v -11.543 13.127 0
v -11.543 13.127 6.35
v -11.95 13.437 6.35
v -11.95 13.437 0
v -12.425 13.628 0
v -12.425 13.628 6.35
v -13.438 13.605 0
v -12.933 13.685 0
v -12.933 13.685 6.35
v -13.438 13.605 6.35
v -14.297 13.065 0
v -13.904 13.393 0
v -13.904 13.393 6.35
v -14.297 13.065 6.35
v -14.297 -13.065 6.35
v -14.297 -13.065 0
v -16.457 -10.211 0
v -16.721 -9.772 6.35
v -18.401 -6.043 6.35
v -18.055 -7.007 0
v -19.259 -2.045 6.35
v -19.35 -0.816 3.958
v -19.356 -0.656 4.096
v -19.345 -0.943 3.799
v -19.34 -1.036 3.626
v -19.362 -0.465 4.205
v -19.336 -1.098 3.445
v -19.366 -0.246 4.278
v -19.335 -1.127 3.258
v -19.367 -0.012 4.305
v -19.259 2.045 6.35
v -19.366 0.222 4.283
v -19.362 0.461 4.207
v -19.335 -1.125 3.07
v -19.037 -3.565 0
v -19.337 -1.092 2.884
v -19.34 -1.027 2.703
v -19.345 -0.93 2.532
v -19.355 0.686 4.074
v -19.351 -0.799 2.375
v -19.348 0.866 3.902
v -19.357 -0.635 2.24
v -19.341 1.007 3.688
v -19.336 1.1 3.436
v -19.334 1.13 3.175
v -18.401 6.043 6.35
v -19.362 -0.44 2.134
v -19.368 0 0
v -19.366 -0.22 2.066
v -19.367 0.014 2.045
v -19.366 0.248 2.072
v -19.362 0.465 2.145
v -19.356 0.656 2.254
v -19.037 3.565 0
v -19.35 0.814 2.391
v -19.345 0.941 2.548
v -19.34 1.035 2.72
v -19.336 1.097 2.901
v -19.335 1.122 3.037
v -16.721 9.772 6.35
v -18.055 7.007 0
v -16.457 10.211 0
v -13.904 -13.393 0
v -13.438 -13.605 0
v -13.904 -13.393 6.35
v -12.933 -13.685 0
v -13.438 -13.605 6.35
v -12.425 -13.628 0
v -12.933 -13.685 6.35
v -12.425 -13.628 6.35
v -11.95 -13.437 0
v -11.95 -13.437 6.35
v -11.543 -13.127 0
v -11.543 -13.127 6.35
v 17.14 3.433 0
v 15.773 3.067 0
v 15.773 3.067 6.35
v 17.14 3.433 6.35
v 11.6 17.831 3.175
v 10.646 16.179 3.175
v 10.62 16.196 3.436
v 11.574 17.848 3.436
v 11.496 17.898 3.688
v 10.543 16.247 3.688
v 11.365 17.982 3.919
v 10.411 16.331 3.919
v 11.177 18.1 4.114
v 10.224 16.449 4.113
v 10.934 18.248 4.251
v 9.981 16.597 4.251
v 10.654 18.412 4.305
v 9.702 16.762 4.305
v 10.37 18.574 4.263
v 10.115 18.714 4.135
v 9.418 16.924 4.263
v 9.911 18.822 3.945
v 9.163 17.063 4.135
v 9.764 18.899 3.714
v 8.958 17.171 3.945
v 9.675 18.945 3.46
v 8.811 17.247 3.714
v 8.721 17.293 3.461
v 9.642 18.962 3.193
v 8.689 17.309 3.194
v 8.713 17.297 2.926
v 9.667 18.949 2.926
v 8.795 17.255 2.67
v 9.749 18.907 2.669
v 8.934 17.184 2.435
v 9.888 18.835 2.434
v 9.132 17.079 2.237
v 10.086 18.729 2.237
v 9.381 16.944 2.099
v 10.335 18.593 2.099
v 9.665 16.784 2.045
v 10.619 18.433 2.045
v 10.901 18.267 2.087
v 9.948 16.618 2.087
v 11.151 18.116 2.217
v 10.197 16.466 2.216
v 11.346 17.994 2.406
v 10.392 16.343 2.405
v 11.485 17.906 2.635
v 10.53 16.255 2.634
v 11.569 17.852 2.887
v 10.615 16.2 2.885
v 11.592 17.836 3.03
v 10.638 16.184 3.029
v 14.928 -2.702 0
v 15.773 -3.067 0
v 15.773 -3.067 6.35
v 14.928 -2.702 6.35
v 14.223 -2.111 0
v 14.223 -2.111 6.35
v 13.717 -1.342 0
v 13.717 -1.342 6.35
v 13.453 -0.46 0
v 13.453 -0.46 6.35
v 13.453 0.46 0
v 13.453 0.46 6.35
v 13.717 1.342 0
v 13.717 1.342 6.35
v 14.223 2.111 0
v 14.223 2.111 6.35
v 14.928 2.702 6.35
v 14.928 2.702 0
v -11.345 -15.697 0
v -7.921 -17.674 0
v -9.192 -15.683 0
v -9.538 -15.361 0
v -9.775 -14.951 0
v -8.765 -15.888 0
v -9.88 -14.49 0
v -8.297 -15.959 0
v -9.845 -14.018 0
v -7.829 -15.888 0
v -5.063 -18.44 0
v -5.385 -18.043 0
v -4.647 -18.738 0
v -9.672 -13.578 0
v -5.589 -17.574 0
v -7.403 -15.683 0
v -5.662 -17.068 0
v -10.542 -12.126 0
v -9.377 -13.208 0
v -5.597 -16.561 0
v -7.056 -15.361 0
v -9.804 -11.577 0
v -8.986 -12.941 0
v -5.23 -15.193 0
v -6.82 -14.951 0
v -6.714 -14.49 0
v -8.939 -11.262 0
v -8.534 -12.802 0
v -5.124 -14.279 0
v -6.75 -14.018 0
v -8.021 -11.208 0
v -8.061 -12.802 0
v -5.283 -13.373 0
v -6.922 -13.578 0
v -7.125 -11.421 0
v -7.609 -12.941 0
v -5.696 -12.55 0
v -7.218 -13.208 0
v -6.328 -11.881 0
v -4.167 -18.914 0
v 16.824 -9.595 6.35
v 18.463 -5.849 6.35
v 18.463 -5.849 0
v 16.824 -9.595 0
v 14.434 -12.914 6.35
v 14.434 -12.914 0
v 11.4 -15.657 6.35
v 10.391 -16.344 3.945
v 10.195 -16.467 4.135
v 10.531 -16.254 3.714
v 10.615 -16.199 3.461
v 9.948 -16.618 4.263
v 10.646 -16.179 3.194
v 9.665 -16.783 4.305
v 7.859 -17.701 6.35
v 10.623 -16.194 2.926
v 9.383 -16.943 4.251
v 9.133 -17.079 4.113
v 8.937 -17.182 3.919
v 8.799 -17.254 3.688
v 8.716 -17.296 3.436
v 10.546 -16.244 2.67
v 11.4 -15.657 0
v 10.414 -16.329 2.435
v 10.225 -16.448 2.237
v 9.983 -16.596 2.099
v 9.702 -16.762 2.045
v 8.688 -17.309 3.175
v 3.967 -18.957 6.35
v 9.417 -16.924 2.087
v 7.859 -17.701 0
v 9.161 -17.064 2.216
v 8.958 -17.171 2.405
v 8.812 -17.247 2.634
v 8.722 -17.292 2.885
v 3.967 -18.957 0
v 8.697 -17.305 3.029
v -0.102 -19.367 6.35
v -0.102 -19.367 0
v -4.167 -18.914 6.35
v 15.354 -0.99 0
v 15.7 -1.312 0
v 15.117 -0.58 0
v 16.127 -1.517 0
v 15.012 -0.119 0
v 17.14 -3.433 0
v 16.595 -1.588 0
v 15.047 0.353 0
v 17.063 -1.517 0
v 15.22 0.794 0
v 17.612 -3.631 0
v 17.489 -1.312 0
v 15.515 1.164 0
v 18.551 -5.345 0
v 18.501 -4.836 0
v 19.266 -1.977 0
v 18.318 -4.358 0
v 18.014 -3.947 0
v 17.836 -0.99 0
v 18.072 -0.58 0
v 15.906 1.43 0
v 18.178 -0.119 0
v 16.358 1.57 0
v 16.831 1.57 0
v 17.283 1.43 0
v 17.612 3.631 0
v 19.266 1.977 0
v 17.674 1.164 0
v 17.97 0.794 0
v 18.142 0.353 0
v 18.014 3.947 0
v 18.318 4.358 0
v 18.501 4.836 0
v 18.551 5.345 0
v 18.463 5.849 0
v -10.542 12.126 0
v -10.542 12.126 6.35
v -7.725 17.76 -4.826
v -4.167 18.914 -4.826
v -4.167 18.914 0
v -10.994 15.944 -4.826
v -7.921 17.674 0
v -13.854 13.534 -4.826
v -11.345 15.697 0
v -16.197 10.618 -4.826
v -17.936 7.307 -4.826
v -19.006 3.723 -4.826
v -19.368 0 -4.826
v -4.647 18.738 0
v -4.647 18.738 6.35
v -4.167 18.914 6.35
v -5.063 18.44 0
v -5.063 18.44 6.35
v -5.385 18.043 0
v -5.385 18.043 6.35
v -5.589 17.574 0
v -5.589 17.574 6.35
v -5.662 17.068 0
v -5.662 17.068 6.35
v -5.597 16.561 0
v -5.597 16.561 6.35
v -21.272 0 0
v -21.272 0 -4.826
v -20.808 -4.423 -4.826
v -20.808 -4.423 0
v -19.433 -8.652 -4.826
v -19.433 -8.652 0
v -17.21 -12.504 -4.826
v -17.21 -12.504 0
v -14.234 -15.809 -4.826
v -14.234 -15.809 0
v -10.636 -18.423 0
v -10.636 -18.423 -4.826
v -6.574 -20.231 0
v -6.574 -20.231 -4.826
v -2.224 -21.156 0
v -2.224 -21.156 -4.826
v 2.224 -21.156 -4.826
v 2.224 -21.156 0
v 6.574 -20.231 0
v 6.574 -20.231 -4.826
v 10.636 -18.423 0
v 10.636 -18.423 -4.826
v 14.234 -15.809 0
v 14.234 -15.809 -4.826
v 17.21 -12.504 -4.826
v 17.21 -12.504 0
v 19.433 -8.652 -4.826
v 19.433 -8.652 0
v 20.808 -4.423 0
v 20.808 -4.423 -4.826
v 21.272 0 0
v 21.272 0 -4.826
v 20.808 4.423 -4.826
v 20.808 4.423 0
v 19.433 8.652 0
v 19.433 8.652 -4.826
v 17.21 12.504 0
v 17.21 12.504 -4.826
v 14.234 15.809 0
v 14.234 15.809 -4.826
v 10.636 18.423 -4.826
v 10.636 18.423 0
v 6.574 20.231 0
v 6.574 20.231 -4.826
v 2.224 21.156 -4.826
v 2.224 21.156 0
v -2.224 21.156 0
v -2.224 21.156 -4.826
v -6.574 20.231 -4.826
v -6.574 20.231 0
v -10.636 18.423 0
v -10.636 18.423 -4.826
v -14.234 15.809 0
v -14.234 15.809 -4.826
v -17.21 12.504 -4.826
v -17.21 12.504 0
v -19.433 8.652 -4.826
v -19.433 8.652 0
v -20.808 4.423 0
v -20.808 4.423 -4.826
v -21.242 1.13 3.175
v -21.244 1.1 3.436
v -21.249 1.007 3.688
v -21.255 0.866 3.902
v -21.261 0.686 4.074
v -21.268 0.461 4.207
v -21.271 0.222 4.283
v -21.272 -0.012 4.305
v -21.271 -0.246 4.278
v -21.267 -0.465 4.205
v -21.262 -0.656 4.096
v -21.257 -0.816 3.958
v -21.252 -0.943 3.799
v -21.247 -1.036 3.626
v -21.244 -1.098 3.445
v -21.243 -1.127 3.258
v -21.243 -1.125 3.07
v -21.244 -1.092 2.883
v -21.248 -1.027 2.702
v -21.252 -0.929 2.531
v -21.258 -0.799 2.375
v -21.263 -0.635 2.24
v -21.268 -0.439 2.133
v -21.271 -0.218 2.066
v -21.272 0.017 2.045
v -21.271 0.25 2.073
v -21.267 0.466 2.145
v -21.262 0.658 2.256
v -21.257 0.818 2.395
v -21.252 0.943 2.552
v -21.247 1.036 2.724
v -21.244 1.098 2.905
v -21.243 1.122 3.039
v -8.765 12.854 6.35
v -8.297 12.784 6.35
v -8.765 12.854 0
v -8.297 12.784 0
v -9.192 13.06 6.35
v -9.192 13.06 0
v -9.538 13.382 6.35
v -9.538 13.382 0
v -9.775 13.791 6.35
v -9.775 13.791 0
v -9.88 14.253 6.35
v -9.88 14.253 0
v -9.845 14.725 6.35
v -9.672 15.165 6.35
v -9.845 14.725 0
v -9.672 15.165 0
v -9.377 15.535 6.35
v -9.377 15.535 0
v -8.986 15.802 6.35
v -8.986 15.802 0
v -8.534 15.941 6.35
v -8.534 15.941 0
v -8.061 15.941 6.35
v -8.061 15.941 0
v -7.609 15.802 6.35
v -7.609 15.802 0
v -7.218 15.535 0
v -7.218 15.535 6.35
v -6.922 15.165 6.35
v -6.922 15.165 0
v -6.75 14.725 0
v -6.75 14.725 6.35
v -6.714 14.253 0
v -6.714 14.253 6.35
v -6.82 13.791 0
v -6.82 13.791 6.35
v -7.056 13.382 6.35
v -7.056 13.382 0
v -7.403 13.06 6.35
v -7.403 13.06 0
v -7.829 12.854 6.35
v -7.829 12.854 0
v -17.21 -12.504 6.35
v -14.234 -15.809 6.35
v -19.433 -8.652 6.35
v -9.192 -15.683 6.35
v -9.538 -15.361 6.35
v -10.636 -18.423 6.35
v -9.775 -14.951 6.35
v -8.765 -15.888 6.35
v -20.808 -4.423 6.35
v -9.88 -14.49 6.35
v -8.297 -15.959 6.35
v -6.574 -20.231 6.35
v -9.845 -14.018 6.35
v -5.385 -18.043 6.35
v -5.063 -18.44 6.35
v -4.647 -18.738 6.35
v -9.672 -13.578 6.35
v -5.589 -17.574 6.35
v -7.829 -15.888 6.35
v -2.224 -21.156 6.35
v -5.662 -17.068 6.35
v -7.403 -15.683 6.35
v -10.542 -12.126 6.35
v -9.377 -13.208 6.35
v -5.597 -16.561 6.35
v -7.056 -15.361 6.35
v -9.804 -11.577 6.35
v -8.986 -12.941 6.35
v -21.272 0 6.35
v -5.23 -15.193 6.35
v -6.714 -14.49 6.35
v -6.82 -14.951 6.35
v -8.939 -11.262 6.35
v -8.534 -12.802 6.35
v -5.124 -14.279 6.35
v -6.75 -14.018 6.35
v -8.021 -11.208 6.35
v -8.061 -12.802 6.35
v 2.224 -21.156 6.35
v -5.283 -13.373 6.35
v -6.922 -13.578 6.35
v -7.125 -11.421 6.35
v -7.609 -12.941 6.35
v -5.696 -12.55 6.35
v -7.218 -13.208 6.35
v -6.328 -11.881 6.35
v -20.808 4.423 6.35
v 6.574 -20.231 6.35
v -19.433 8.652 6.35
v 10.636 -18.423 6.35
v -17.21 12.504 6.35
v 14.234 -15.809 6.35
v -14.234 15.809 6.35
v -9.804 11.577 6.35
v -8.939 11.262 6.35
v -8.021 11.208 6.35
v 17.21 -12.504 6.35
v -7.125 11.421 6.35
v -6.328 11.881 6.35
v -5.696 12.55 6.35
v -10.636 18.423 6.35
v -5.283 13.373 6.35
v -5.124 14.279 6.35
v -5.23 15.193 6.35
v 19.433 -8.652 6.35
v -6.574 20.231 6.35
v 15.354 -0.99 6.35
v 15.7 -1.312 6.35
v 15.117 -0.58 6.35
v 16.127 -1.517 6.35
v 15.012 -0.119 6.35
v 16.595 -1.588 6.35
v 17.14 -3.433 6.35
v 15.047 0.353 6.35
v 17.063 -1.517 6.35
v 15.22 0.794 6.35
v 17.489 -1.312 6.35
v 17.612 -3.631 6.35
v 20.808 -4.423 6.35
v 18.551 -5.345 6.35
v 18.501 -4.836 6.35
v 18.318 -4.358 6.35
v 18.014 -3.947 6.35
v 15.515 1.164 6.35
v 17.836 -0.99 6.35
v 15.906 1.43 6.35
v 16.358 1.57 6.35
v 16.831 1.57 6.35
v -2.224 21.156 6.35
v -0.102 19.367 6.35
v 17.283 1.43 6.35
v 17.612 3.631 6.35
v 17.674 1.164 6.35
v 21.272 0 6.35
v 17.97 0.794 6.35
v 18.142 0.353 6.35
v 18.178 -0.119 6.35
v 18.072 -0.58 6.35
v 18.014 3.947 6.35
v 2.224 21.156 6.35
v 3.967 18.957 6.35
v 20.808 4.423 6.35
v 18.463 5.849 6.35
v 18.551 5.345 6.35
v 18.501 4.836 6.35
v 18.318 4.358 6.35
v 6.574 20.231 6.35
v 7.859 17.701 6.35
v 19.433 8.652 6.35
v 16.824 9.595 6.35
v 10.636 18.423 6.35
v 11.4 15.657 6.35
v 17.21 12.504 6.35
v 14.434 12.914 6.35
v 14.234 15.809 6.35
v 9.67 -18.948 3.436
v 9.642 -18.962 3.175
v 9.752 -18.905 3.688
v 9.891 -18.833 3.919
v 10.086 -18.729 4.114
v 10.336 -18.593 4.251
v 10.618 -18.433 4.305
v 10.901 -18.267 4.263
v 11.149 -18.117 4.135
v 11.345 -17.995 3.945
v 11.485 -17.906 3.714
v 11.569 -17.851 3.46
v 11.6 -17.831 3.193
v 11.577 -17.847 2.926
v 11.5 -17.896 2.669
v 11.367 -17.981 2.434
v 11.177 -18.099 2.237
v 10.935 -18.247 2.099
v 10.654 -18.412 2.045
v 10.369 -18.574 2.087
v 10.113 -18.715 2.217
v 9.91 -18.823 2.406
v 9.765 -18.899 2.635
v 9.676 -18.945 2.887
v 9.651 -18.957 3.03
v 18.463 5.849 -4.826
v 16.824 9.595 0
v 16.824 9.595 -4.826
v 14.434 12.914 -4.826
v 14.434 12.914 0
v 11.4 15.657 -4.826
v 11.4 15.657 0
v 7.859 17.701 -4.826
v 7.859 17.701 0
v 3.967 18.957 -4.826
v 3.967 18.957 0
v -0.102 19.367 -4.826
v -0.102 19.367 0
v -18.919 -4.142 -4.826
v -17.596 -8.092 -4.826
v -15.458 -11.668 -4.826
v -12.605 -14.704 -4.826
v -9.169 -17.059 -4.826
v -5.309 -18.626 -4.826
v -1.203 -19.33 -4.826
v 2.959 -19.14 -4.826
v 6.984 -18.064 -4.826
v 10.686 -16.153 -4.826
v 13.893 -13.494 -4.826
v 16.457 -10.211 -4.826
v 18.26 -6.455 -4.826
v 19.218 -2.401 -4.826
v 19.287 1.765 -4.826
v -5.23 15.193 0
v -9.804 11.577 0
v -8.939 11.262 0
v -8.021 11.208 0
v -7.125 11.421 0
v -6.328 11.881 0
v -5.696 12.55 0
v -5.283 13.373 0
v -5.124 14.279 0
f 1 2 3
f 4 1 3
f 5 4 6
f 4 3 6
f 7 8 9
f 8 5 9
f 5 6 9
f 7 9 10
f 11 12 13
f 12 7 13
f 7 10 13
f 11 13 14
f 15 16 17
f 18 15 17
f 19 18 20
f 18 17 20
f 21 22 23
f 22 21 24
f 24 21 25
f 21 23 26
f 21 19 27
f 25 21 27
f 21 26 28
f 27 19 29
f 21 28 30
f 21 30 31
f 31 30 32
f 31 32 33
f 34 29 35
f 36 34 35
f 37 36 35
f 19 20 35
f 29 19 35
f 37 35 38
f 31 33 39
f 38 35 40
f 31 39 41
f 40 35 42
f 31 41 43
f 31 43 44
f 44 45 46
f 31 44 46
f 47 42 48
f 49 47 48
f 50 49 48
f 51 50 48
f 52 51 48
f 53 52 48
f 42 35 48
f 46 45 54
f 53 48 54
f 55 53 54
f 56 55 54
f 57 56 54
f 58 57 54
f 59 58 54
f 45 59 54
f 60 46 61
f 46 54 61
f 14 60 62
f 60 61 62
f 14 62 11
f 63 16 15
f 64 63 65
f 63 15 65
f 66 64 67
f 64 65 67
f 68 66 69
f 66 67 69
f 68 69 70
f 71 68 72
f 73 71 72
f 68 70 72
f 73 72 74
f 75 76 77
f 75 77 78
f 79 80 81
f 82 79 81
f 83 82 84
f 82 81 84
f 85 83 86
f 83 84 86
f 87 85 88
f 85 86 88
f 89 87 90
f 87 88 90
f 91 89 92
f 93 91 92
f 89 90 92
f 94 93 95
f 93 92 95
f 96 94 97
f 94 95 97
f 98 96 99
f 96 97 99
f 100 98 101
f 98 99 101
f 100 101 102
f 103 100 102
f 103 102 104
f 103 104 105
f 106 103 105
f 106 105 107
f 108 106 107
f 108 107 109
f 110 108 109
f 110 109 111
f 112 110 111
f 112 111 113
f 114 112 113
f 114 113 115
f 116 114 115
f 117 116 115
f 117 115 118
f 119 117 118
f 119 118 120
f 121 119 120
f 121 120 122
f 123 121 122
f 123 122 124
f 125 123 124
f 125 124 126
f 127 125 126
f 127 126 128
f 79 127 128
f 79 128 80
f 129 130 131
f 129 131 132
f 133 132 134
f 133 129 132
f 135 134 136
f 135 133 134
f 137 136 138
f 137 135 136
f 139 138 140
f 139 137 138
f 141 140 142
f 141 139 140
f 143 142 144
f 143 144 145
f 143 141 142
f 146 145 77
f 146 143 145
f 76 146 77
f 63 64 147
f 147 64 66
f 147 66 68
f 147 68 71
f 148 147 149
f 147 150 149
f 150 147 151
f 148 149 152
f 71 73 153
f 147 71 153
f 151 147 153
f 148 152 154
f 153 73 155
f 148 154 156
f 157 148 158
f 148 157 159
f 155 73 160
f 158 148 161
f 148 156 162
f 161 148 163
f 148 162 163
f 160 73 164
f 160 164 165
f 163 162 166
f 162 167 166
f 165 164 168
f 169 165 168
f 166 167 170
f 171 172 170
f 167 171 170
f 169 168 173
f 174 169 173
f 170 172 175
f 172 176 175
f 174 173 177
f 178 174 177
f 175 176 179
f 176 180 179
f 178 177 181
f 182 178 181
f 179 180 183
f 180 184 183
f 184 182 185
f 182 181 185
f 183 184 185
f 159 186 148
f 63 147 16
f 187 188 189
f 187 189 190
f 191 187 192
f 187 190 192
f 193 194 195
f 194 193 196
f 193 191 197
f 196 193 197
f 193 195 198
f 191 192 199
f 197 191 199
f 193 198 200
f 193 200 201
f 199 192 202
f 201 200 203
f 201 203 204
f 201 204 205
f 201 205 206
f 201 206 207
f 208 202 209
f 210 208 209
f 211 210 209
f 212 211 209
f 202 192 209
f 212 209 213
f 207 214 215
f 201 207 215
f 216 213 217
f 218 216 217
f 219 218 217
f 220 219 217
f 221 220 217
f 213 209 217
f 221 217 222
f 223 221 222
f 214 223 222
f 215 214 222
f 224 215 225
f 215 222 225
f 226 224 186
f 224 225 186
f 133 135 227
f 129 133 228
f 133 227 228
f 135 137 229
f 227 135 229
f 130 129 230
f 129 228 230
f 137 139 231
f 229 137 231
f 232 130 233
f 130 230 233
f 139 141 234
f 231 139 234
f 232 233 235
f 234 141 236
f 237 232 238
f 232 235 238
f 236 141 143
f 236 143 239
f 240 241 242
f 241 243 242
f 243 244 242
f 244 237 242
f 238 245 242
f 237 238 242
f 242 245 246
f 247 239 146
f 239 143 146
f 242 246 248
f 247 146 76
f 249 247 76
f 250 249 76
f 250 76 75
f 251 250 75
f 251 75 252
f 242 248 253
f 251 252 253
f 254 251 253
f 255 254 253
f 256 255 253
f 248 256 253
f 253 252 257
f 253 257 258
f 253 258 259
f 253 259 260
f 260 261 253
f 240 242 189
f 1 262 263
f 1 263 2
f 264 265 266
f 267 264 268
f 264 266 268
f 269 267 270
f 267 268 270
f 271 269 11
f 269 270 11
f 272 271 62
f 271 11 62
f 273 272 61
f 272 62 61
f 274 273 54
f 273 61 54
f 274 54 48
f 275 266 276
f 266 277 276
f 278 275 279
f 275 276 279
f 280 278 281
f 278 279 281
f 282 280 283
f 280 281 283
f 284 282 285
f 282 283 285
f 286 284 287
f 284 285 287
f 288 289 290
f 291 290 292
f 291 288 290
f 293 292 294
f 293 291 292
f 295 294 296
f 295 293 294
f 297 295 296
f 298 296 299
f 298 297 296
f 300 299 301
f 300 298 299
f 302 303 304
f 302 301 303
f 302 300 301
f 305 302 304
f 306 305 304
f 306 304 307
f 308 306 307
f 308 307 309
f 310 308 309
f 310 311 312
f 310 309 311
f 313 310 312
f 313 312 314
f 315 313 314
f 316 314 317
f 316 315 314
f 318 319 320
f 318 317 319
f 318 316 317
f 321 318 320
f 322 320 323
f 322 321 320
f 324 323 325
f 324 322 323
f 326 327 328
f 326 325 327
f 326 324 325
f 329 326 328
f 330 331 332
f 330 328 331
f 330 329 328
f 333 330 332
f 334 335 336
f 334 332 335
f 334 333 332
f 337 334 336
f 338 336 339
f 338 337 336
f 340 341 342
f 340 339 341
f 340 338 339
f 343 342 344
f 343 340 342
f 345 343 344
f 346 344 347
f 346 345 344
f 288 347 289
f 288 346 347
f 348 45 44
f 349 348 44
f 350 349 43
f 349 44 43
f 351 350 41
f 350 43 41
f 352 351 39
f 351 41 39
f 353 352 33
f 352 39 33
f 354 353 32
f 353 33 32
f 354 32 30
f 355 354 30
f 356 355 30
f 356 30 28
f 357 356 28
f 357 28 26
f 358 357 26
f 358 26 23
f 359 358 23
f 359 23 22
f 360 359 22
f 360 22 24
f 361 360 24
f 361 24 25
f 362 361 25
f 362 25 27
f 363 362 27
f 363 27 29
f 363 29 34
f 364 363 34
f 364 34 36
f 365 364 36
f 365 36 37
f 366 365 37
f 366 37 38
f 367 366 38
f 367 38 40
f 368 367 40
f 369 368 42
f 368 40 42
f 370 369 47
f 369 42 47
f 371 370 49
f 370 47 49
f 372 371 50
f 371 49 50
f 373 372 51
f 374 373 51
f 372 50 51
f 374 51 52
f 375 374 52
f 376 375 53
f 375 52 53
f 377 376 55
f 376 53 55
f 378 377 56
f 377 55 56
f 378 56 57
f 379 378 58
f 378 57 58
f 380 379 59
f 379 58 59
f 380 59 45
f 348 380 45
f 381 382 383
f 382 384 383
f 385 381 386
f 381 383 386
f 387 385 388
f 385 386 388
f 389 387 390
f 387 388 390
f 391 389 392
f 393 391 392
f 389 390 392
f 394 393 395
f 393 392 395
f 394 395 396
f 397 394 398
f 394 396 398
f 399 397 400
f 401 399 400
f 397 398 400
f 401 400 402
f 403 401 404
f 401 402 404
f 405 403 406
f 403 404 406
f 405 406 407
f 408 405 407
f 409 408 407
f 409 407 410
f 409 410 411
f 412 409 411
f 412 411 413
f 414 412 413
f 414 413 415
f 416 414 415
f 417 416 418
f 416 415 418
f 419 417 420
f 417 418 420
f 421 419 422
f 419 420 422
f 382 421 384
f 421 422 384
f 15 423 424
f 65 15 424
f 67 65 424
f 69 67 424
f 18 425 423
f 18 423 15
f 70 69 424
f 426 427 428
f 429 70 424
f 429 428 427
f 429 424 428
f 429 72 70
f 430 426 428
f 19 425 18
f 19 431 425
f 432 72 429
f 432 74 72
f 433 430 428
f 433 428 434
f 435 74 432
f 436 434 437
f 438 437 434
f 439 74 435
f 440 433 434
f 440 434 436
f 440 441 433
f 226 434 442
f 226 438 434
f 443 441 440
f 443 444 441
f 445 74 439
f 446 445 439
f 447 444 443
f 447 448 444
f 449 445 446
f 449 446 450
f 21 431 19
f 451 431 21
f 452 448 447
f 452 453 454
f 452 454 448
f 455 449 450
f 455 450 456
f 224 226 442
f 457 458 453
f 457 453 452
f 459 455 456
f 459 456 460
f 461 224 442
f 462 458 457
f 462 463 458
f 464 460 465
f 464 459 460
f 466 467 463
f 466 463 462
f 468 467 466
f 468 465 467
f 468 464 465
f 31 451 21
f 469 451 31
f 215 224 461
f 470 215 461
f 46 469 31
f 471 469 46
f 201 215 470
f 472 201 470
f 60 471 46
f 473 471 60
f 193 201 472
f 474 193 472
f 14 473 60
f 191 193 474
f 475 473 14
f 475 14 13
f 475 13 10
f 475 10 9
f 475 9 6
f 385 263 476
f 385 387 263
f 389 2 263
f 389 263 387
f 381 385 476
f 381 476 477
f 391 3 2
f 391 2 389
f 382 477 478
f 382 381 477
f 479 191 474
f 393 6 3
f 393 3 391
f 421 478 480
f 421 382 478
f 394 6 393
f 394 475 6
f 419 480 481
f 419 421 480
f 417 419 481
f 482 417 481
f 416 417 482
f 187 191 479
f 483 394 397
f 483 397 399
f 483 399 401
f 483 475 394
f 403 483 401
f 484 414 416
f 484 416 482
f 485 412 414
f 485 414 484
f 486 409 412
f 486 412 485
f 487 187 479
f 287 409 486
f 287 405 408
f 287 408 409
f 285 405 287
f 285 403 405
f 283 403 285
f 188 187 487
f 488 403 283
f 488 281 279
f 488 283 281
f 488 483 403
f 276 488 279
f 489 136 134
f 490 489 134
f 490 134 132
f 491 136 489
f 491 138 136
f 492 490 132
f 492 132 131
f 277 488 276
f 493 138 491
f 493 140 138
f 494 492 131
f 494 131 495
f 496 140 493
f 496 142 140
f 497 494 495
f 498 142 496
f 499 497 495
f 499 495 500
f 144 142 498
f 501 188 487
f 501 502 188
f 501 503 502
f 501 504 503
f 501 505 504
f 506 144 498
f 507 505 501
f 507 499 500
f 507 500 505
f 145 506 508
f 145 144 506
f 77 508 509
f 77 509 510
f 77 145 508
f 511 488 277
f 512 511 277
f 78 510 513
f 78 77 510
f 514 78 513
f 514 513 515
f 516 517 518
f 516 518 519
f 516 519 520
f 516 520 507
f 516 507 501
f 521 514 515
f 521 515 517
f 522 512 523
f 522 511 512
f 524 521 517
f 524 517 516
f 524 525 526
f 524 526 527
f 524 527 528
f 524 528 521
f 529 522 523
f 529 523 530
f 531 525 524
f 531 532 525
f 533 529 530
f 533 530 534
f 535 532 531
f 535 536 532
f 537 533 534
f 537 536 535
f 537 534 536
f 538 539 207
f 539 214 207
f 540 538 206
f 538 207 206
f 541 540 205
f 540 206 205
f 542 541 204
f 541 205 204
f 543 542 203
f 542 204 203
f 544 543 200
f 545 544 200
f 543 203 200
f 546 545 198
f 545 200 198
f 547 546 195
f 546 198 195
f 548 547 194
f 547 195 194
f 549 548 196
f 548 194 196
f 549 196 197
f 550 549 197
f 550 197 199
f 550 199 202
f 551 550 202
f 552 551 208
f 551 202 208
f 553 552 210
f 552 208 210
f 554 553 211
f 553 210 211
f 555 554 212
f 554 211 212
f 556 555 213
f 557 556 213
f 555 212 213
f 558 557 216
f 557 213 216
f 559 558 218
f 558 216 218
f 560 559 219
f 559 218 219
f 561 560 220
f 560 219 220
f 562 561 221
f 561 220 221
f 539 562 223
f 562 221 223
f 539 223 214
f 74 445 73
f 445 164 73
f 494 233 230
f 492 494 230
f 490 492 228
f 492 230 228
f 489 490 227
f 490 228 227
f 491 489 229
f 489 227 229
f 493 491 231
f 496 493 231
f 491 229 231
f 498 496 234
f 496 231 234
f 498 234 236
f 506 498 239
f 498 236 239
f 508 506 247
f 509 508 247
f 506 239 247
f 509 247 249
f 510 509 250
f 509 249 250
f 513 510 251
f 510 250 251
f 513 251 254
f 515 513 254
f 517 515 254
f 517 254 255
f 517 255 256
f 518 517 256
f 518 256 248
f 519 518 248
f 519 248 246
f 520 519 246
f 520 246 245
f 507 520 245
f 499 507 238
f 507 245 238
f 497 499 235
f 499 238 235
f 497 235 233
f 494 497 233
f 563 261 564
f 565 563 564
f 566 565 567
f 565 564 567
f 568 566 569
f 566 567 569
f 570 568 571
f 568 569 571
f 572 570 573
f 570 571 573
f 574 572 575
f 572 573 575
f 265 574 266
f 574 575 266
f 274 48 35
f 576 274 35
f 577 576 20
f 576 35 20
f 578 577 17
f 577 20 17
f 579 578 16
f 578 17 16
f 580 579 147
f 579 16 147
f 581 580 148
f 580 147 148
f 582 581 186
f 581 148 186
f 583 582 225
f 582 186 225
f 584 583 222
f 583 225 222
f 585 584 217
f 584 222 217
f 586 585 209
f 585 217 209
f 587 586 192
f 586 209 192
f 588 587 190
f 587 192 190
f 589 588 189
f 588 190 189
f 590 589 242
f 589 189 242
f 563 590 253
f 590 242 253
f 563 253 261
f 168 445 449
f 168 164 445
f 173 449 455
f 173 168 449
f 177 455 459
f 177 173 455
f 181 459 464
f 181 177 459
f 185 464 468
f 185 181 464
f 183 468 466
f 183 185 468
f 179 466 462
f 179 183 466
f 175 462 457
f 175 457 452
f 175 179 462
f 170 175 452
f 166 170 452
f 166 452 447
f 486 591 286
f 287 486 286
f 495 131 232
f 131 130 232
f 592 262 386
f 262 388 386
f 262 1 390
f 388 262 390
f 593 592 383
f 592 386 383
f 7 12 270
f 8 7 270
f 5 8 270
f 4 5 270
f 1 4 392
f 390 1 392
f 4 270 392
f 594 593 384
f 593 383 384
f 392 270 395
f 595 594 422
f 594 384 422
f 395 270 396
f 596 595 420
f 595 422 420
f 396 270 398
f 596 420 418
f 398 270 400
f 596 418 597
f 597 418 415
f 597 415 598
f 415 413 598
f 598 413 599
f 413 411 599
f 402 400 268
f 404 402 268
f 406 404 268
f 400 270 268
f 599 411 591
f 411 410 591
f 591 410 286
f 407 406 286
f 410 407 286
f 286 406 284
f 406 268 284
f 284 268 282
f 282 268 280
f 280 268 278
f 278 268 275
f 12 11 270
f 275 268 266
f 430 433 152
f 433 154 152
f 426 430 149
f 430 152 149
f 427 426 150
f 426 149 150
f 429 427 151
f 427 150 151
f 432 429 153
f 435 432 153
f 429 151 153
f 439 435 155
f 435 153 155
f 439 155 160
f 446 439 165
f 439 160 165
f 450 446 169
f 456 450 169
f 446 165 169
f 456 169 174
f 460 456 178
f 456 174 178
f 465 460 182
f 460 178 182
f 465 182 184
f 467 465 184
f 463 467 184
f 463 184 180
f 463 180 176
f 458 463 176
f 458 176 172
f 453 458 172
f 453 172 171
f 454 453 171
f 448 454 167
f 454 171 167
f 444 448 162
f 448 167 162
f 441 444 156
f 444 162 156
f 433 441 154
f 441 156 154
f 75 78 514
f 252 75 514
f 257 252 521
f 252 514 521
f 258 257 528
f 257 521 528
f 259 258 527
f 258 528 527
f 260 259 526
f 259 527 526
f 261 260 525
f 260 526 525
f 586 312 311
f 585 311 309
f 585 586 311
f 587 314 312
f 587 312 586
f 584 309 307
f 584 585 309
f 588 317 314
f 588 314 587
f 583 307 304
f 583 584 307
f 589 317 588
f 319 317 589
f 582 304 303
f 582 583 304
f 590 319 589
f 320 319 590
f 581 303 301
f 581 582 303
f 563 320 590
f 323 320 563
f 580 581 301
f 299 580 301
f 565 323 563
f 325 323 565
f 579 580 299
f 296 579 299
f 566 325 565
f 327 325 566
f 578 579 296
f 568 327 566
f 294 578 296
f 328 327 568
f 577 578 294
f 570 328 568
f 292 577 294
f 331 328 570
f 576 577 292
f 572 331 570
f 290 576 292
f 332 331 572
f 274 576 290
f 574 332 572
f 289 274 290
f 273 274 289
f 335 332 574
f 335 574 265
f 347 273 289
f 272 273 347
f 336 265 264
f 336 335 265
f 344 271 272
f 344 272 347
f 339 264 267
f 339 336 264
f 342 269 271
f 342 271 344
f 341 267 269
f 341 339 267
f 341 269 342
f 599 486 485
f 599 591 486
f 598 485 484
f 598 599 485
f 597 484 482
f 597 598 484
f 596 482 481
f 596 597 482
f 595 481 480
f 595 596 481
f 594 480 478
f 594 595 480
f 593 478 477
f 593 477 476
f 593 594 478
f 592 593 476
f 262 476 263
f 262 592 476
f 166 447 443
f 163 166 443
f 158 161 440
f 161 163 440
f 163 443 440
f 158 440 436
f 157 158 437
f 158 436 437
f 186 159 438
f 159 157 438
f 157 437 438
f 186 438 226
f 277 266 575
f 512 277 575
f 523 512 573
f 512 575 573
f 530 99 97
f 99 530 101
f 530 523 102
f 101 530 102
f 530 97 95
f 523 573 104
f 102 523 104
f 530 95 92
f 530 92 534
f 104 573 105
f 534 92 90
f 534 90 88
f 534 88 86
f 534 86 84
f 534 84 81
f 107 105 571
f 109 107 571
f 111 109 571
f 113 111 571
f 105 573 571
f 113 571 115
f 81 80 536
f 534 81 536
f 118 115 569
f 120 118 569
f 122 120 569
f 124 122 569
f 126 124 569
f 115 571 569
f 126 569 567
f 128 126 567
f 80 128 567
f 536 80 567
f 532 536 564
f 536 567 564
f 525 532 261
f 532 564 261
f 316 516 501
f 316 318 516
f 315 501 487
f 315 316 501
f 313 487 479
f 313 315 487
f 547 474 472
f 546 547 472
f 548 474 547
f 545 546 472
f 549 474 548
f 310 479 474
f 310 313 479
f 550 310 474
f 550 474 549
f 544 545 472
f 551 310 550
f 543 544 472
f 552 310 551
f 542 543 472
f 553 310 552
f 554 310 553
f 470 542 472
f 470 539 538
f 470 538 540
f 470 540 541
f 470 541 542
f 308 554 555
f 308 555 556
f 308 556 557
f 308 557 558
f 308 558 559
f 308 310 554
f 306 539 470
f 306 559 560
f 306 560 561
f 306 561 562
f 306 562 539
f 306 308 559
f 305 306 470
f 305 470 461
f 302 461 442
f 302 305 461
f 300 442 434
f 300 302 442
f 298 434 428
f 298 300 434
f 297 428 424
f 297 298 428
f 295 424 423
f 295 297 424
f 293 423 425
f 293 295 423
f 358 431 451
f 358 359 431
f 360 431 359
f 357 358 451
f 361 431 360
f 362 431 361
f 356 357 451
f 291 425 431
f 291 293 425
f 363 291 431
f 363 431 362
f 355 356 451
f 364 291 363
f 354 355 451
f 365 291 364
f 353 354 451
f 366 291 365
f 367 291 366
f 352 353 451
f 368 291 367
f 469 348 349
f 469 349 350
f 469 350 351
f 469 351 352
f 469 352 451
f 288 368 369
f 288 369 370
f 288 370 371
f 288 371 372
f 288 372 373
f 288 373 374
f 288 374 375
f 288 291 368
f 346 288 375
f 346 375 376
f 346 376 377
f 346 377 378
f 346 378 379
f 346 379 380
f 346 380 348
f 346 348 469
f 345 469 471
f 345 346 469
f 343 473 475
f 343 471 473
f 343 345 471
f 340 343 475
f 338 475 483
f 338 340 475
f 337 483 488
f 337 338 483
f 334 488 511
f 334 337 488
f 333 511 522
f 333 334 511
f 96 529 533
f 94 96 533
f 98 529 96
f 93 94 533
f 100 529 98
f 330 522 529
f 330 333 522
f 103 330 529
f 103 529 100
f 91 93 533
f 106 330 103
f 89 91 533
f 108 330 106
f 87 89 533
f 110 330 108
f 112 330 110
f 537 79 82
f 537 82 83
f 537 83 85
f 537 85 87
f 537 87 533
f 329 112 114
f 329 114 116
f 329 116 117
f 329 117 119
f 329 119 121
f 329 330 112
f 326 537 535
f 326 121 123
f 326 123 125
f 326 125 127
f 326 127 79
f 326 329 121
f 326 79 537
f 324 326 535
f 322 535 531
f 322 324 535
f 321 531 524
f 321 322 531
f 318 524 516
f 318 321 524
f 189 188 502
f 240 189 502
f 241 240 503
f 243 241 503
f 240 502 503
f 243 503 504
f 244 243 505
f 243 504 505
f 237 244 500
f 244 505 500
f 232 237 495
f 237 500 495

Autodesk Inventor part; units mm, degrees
ref_plane "YZ Plane" through (0, 0, 0) normal (1, 0, 0) x (0, 1, 0)
ref_plane "XZ Plane" through (0, 0, 0) normal (0, 1, 0) x (-1, 0, 0)
ref_plane "XY Plane" through (0, 0, 0) normal (0, 0, 1) x (1, 0, 0)
sketch "Sketch1" plane through (0, 0, 0) normal (0, 0, 1) x (1, 0, 0)
  circle A0 centre (0, 0) radius 19.3675
  circle A1 centre (0, 0) radius 21.2725
  dimension "d0" = 38.735
  dimension "d1" = 42.545
extrude "Extrusion1" add sketch "Sketch1" along normal blind 6.35
sketch "Sketch2" plane through (0, 0, 0) normal (0, 0, -1) x (-1, 0, 0)
  line L0 (-16.5947, 0) -> (8.2973, 14.3714) construction
  line L1 (8.2973, 14.3714) -> (8.2973, -14.3714) construction
  line L2 (8.2973, -14.3714) -> (-16.5947, 0) construction
  arc A0 (-15.7729, -3.0668) -> (-15.7729, 3.0668) centre (-16.5947, 0) ccw
  circle A1 centre (0, 0) radius 19.3675 construction
  arc A2 (-18.9661, 3.9224) -> (-18.9661, -3.9224) centre (0, 0) ccw
  line L3 (-15.7729, -3.0668) -> (-18.9661, -3.9224)
  line L4 (-15.7729, 3.0668) -> (-18.9661, 3.9224)
  line L5 (0, 0) -> (-17.8049, 0) construction
  arc A3 (10.5424, -12.1263) -> (5.2305, -15.1932) centre (8.2973, -14.3714) ccw
  arc A4 (6.0861, -18.3864) -> (12.88, -14.4639) centre (0, 0) ccw
  line L6 (10.5424, -12.1263) -> (12.88, -14.4639)
  line L7 (5.2305, -15.1932) -> (6.0861, -18.3864)
  arc A5 (5.2305, 15.1932) -> (10.5424, 12.1263) centre (8.2973, 14.3714) ccw
  arc A6 (12.88, 14.4639) -> (6.0861, 18.3864) centre (0, 0) ccw
  line L8 (5.2305, 15.1932) -> (6.0861, 18.3864)
  line L9 (10.5424, 12.1263) -> (12.88, 14.4639)
  line L10 (0, 0) -> (-13.4197, 0) construction
  circle A7 centre (0, 0) radius 19.05 construction
  line L11 (19.05, -19.05) -> (-19.05, -19.05) construction
  line L12 (-19.05, -19.05) -> (-19.05, 19.05) construction
  line L13 (-19.05, 19.05) -> (19.05, 19.05) construction
  line L14 (19.05, 19.05) -> (19.05, -19.05) construction
  line L15 (19.05, -19.05) -> (-19.05, 19.05) construction
  line L16 (-19.05, -19.05) -> (19.05, 19.05) construction
  point P0 (8.9024, -15.4195)
  point P1 (8.9024, 15.4195)
  point P2 (0, 19.05)
  dimension "d62" = 38.1
  dimension "d5" = 6.35
  dimension "d7" = 30
  dimension "d10" = 360
  dimension "d59" = 13.4197
  dimension "d63" = 38.1
  dimension "d65" = 24.892
extrude "Extrusion2" add sketch "Sketch2" against normal up to surface (6.35 mm away)
fillet "Fillet1" radius 1.905 6 edges at (-6.0861, 18.3864, 3.175) (-12.88, 14.4639, 3.175) (18.9661, -3.9224, 3.175) (18.9661, 3.9224, 3.175) (-12.88, -14.4639, 3.175) (-6.0861, -18.3864, 3.175)
sketch "Sketch3" plane through (0, 0, 6.35) normal (0, 0, 1) x (1, 0, 0)
  arc A0 (-10.5424, 12.1263) -> (-5.2305, 15.1932) centre (-8.2973, 14.3714) ccw construction
  arc A1 (-5.2305, -15.1932) -> (-10.5424, -12.1263) centre (-8.2973, -14.3714) ccw construction
  arc A2 (15.7729, 3.0668) -> (15.7729, -3.0668) centre (16.5947, 0) ccw construction
  point P0 (0, 0)
hole "Hole1" at (-8.2973, 14.3714, 6.35) at (16.5947, 0, 6.35) at (-8.2973, -14.3714, 6.35) direction (0, 0, -1) diameter 3.175 end through all
sketch "Sketch11" plane through (0, 0, 0) normal (1, 0, 0) x (0, 1, 0)
  circle A0 centre (0, 3.175) radius 1.1303
  line L0 (13.0654, 0) -> (-13.0654, 0) projected
  line L1 (-13.0654, 6.35) -> (13.0654, 6.35) projected
  point P0 (0, 0)
  point P1 (0, 0)
  dimension "d51" = 2.2606
  dimension "d52" = 3.175
  dimension "d53" = 6.35
extrude "Extrusion7" cut sketch "Sketch11" against normal through all
pattern_circular "Circular Pattern1" count 3 over 360 about axis through (0, 0, 0) along (0, 0, 1) of "Extrusion7"
sketch "Sketch12" plane through (0, 0, 0) normal (0, 0, -1) x (-1, 0, 0)
  arc A0 (4.1667, 18.914) -> (-18.4633, 5.8486) centre (0, 0) ccw projected
  circle A1 centre (0, 0) radius 19.3675
  circle A2 centre (0, 0) radius 21.2725
extrude "Extrusion8" add sketch "Sketch12" along normal blind 4.826
equation "\"d52\" = 0.5 * d53"
properties part number "Board Spacer"
